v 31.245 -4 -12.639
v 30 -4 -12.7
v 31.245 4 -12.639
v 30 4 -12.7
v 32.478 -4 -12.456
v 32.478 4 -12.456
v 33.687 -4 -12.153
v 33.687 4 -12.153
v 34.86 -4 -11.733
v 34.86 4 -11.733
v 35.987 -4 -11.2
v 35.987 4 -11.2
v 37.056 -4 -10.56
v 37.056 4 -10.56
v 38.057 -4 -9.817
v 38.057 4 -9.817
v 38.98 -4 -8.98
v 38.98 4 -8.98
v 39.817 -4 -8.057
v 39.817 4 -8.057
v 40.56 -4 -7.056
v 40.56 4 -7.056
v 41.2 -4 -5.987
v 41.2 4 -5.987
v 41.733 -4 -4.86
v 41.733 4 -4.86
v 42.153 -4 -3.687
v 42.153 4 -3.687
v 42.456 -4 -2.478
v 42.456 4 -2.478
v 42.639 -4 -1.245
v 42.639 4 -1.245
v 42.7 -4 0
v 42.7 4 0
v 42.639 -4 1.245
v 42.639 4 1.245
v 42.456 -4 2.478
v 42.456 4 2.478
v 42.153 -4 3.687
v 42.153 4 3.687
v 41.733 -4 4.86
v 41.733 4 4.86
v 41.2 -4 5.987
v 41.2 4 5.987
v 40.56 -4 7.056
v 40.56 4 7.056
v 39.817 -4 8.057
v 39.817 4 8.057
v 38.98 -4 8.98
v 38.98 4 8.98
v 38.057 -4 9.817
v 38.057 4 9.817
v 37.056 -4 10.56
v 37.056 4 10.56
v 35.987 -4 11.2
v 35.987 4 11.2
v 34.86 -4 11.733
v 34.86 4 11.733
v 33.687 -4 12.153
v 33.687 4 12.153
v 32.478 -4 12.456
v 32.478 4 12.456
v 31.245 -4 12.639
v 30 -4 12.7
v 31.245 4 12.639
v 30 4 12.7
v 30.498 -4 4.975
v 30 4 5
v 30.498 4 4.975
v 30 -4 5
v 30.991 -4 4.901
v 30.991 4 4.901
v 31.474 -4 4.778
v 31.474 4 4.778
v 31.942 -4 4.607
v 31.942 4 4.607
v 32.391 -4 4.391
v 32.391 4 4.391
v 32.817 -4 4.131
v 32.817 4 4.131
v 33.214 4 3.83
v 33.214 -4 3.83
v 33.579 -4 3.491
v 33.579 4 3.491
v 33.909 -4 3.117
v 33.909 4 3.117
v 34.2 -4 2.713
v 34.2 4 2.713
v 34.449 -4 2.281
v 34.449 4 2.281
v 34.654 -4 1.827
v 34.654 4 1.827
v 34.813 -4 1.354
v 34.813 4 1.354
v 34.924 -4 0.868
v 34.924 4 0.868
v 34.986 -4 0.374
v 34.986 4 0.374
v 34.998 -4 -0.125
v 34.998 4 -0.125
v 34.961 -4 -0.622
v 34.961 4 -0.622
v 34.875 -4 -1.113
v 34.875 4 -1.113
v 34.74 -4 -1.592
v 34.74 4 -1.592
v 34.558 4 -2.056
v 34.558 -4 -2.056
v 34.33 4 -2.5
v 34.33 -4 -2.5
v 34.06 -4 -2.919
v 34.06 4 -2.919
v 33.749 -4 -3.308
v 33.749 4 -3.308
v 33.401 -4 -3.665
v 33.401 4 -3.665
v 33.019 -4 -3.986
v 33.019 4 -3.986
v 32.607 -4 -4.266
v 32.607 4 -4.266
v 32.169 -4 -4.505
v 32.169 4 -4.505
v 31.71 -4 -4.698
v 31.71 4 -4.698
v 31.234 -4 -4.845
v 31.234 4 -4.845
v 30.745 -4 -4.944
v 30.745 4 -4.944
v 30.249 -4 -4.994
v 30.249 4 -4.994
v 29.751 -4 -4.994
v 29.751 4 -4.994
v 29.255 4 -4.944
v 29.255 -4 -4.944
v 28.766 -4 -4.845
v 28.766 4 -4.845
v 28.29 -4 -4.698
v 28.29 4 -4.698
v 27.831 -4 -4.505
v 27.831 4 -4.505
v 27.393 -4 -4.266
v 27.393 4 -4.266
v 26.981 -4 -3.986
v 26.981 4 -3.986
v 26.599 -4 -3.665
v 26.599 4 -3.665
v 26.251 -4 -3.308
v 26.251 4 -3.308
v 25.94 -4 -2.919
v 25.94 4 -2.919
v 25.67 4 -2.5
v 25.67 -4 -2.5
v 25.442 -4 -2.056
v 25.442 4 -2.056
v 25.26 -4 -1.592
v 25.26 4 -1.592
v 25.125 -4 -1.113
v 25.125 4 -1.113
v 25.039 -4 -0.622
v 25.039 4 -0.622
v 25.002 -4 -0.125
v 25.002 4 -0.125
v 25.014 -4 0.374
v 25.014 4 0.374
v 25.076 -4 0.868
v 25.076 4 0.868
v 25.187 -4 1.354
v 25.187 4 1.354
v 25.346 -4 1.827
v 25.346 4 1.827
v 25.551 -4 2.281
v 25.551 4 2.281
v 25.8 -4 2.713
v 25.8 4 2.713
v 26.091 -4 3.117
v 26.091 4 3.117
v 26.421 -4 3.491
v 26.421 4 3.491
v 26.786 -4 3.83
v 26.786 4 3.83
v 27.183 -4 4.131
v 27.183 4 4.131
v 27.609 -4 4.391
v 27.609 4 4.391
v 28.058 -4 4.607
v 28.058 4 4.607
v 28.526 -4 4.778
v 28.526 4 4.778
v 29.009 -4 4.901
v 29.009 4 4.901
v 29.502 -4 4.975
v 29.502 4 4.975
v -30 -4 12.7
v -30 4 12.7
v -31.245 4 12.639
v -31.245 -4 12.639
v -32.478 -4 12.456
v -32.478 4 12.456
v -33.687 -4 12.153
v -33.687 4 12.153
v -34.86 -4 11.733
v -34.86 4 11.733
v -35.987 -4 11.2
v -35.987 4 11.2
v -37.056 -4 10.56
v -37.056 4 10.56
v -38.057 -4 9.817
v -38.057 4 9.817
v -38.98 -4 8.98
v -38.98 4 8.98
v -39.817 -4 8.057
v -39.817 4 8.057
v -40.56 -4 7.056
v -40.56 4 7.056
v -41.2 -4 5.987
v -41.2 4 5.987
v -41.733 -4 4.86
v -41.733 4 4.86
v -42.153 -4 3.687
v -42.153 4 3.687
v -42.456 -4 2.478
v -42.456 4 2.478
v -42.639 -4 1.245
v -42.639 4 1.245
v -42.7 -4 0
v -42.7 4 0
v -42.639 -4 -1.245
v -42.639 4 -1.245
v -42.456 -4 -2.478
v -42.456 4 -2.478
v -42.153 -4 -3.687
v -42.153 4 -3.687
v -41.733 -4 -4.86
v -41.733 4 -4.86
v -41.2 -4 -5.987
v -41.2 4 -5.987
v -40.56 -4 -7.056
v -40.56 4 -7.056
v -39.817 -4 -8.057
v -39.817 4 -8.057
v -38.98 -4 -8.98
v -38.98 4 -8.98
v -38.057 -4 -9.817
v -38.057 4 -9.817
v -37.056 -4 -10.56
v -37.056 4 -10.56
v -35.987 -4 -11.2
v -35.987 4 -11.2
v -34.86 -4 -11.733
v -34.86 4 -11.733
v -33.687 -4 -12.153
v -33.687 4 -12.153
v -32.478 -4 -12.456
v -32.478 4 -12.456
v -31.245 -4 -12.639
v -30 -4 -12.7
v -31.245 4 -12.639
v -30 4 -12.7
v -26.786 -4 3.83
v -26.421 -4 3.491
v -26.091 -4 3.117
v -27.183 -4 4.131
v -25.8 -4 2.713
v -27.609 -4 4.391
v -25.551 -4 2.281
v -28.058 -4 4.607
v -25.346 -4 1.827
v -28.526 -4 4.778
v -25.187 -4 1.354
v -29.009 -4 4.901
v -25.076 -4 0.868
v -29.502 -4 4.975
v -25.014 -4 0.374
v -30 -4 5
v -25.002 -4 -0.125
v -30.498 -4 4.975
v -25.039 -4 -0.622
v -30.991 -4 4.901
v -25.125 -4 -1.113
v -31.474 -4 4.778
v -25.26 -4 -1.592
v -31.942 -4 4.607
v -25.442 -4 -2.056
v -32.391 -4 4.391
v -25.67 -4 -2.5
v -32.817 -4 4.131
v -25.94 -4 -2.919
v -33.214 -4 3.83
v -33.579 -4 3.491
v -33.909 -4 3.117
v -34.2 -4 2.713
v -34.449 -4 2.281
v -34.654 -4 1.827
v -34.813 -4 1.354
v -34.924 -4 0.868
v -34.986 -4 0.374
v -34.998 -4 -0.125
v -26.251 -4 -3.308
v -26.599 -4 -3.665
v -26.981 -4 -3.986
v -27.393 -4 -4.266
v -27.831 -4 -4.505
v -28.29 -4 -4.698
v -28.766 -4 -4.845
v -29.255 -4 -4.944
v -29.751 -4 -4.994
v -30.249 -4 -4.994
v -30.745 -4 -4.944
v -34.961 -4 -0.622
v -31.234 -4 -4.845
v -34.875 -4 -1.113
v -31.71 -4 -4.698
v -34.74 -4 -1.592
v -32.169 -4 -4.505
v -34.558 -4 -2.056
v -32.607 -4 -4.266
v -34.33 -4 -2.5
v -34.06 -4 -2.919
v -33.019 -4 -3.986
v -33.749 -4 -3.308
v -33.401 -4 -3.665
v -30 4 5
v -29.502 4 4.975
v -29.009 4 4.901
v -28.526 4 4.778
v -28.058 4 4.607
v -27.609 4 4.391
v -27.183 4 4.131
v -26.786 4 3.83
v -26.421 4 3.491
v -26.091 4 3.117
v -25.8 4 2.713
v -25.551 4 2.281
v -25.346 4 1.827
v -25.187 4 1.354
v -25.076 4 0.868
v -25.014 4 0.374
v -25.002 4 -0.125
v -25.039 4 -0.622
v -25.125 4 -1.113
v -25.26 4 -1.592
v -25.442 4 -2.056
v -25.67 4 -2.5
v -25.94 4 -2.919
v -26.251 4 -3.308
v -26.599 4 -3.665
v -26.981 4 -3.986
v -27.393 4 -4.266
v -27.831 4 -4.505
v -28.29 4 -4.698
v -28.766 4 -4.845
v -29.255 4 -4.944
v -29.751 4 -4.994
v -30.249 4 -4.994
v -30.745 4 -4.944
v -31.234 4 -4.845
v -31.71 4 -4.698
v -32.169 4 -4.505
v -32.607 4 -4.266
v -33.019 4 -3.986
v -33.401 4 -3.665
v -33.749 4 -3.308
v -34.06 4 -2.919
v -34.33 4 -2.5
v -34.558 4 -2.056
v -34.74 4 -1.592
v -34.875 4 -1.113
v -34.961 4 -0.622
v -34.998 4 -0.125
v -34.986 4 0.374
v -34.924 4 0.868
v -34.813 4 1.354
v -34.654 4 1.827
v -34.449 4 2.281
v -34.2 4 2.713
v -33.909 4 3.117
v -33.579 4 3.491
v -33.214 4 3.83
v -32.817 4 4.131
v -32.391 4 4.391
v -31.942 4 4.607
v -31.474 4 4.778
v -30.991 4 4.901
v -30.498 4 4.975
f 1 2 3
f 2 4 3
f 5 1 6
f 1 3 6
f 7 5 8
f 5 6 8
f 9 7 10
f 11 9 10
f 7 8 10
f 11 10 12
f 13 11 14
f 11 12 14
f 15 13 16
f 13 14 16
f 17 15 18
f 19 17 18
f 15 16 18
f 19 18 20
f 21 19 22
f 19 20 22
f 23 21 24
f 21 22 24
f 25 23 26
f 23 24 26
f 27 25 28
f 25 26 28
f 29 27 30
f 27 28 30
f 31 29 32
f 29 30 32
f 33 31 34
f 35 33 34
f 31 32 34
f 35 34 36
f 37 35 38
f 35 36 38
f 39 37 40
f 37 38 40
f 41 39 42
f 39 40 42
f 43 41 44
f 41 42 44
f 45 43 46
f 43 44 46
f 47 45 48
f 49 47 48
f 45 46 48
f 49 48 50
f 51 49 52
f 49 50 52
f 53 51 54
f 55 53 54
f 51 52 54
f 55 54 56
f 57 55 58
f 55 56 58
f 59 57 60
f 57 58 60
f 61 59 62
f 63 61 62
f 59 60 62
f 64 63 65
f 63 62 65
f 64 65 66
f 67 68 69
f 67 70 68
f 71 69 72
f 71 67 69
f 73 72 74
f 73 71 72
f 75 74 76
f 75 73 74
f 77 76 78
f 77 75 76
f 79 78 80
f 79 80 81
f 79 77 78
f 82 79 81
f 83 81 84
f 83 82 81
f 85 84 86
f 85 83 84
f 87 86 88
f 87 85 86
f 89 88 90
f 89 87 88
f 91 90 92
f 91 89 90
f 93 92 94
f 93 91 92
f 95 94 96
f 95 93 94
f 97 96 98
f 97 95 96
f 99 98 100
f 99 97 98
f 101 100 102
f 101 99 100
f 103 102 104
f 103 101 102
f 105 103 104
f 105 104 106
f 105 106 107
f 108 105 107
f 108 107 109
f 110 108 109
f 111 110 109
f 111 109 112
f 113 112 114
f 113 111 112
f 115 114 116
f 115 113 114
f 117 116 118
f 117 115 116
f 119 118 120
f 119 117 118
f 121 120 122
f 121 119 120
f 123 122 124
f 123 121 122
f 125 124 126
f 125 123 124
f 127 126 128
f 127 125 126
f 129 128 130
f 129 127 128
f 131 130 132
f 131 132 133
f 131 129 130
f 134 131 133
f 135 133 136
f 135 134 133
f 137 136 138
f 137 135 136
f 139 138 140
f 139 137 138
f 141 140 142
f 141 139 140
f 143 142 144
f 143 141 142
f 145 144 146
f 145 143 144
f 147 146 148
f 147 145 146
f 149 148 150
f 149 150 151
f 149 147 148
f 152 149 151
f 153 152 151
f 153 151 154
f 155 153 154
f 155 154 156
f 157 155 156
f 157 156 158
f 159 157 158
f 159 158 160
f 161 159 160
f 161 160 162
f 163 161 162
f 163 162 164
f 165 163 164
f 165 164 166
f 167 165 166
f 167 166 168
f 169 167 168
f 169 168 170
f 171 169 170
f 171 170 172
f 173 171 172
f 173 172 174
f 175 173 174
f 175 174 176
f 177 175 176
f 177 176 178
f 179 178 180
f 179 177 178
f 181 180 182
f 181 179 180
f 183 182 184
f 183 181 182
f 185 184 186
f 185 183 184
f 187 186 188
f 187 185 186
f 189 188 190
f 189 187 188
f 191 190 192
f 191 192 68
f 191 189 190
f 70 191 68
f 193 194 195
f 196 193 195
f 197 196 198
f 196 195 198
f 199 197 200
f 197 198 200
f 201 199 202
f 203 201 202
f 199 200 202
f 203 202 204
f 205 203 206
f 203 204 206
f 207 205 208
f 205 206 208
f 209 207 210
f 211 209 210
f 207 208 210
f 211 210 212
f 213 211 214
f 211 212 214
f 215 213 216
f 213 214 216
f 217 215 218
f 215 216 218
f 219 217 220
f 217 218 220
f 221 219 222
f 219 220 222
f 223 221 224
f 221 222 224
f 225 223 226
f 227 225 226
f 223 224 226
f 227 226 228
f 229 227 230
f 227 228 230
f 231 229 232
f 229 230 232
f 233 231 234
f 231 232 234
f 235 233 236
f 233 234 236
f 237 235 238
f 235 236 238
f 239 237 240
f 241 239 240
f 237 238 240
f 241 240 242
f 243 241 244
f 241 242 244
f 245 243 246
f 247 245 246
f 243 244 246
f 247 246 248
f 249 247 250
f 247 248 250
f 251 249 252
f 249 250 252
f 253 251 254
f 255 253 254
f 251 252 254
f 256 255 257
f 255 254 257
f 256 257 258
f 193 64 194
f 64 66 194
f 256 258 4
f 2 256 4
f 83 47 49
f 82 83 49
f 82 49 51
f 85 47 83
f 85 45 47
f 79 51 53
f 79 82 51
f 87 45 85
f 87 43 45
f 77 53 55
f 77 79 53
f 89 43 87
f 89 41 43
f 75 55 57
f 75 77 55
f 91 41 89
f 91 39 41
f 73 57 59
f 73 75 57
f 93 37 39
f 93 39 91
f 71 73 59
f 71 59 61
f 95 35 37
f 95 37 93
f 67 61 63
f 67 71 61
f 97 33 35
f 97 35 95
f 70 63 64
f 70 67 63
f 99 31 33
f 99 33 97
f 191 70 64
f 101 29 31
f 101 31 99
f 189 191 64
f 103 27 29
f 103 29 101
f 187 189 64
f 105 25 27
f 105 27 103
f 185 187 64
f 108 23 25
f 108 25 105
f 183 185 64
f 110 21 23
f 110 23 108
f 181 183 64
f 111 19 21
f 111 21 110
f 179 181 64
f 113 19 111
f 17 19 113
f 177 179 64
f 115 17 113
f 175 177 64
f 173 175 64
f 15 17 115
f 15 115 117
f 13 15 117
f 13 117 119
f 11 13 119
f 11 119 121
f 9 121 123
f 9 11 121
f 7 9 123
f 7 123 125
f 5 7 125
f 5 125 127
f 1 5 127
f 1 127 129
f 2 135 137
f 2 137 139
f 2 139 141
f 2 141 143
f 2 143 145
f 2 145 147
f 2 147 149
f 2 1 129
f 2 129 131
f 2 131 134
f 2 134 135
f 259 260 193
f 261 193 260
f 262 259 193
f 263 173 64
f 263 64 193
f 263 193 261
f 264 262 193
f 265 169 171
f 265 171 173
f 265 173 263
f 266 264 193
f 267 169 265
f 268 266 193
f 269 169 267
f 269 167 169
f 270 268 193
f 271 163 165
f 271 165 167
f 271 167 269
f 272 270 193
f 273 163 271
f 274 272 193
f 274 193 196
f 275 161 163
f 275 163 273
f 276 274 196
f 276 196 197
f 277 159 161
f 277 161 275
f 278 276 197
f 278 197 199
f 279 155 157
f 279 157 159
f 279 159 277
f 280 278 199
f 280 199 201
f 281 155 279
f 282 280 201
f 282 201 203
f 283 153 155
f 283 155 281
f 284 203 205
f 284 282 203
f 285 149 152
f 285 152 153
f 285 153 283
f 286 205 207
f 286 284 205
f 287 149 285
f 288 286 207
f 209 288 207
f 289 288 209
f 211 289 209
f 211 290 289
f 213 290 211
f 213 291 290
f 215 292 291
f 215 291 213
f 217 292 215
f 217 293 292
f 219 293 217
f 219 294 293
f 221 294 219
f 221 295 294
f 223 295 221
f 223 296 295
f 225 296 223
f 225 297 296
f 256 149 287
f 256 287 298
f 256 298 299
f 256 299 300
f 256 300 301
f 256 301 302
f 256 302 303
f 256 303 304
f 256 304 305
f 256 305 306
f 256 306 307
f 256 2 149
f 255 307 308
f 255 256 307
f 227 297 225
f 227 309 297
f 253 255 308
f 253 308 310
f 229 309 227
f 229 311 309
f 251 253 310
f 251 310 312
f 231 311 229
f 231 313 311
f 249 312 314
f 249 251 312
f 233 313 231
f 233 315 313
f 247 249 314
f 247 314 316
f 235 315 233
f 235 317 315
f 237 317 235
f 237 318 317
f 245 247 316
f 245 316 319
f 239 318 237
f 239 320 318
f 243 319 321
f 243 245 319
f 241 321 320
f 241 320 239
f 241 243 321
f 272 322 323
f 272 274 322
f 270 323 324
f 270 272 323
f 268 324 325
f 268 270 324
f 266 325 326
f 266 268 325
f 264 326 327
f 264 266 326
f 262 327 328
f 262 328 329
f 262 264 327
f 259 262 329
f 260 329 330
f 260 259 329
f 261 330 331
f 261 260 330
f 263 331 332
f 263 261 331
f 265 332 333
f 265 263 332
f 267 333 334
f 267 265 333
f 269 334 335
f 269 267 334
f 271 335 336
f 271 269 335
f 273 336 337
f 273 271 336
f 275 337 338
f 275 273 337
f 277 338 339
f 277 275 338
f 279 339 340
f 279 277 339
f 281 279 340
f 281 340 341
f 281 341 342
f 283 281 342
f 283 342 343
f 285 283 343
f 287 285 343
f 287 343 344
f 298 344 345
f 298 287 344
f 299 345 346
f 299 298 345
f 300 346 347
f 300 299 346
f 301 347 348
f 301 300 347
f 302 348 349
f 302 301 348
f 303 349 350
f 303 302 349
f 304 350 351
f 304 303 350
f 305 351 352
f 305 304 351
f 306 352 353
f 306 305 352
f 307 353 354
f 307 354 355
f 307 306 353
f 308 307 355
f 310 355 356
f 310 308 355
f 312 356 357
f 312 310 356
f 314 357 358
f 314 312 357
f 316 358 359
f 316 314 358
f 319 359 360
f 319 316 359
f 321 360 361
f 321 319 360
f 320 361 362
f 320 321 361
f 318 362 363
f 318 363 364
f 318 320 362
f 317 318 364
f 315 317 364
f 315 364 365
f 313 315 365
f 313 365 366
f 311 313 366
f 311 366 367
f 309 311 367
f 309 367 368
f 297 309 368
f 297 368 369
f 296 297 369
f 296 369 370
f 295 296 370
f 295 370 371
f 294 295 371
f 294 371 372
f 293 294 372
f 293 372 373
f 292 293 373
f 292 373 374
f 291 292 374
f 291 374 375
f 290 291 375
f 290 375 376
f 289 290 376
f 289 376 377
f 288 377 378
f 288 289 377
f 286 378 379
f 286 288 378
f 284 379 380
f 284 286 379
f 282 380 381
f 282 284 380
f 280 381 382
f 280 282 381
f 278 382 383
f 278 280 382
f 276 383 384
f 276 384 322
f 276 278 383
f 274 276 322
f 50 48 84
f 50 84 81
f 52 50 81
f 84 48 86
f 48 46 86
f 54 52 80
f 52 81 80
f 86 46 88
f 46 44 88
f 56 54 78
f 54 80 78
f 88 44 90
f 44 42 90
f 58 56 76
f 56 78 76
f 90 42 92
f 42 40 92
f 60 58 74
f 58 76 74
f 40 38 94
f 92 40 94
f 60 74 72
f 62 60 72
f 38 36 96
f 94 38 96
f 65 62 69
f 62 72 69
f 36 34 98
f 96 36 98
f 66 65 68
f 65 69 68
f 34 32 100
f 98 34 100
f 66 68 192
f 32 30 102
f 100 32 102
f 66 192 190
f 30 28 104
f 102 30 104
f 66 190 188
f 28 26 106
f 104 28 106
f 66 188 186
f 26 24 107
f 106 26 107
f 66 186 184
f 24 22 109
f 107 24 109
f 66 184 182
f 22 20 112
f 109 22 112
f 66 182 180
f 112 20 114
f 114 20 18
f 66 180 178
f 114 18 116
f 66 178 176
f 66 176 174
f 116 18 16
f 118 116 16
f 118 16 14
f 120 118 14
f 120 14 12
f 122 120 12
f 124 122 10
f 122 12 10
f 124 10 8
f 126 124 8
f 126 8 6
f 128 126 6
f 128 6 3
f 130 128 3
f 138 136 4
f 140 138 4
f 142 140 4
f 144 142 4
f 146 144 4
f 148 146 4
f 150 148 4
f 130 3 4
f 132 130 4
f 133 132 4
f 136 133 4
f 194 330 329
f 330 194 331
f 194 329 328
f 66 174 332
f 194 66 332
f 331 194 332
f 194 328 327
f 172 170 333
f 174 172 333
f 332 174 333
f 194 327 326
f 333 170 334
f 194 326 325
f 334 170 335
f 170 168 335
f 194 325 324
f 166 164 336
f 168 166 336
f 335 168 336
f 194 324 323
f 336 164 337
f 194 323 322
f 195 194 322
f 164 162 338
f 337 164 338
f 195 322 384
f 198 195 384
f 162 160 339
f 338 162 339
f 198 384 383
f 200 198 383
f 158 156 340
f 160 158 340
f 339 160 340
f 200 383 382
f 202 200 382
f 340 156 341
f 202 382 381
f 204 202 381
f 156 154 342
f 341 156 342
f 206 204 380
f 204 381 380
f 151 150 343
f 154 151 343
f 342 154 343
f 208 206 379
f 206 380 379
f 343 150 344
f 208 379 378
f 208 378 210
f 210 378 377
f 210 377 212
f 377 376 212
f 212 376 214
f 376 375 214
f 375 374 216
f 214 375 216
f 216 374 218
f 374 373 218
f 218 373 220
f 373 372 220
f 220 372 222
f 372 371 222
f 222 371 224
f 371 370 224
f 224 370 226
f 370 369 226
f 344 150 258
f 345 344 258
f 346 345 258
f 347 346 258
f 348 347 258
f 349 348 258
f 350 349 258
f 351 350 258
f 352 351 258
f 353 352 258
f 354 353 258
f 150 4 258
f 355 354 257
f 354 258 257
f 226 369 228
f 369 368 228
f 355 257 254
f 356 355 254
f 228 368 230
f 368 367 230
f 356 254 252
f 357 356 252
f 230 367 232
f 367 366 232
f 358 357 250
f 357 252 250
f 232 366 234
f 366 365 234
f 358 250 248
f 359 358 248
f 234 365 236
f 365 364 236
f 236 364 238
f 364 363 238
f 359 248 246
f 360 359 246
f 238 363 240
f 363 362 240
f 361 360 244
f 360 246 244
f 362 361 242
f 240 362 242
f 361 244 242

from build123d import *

# Parameters (mm, degrees)
ESBO_O1_R                = 5
RESSALTO_EXTRUS_O1_DEPTH = 4


with BuildPart() as part:
    # Esboço1 → Ressalto-extrusão1 (new, symmetric)
    with BuildSketch(Plane(origin=(0, 0, 0), x_dir=(1, 0, 0), z_dir=(0, 1, 0))):
        with BuildLine():
            Line((-30, 12.7), (30, 12.7))
            ThreePointArc((30, 12.7), (42.7, 0), (30, -12.7))
            Line((30, -12.7), (-30, -12.7))
            ThreePointArc((-30, -12.7), (-42.7, 0), (-30, 12.7))
        make_face()
        with Locations(Location((30, 0, 0), (0, 0, 270))):
            Circle(ESBO_O1_R, mode=Mode.SUBTRACT)
        with Locations(Location((-30, 0, 0), (0, 0, 270))):
            Circle(ESBO_O1_R, mode=Mode.SUBTRACT)
    extrude(amount=RESSALTO_EXTRUS_O1_DEPTH, both=True)


solid = part.part
